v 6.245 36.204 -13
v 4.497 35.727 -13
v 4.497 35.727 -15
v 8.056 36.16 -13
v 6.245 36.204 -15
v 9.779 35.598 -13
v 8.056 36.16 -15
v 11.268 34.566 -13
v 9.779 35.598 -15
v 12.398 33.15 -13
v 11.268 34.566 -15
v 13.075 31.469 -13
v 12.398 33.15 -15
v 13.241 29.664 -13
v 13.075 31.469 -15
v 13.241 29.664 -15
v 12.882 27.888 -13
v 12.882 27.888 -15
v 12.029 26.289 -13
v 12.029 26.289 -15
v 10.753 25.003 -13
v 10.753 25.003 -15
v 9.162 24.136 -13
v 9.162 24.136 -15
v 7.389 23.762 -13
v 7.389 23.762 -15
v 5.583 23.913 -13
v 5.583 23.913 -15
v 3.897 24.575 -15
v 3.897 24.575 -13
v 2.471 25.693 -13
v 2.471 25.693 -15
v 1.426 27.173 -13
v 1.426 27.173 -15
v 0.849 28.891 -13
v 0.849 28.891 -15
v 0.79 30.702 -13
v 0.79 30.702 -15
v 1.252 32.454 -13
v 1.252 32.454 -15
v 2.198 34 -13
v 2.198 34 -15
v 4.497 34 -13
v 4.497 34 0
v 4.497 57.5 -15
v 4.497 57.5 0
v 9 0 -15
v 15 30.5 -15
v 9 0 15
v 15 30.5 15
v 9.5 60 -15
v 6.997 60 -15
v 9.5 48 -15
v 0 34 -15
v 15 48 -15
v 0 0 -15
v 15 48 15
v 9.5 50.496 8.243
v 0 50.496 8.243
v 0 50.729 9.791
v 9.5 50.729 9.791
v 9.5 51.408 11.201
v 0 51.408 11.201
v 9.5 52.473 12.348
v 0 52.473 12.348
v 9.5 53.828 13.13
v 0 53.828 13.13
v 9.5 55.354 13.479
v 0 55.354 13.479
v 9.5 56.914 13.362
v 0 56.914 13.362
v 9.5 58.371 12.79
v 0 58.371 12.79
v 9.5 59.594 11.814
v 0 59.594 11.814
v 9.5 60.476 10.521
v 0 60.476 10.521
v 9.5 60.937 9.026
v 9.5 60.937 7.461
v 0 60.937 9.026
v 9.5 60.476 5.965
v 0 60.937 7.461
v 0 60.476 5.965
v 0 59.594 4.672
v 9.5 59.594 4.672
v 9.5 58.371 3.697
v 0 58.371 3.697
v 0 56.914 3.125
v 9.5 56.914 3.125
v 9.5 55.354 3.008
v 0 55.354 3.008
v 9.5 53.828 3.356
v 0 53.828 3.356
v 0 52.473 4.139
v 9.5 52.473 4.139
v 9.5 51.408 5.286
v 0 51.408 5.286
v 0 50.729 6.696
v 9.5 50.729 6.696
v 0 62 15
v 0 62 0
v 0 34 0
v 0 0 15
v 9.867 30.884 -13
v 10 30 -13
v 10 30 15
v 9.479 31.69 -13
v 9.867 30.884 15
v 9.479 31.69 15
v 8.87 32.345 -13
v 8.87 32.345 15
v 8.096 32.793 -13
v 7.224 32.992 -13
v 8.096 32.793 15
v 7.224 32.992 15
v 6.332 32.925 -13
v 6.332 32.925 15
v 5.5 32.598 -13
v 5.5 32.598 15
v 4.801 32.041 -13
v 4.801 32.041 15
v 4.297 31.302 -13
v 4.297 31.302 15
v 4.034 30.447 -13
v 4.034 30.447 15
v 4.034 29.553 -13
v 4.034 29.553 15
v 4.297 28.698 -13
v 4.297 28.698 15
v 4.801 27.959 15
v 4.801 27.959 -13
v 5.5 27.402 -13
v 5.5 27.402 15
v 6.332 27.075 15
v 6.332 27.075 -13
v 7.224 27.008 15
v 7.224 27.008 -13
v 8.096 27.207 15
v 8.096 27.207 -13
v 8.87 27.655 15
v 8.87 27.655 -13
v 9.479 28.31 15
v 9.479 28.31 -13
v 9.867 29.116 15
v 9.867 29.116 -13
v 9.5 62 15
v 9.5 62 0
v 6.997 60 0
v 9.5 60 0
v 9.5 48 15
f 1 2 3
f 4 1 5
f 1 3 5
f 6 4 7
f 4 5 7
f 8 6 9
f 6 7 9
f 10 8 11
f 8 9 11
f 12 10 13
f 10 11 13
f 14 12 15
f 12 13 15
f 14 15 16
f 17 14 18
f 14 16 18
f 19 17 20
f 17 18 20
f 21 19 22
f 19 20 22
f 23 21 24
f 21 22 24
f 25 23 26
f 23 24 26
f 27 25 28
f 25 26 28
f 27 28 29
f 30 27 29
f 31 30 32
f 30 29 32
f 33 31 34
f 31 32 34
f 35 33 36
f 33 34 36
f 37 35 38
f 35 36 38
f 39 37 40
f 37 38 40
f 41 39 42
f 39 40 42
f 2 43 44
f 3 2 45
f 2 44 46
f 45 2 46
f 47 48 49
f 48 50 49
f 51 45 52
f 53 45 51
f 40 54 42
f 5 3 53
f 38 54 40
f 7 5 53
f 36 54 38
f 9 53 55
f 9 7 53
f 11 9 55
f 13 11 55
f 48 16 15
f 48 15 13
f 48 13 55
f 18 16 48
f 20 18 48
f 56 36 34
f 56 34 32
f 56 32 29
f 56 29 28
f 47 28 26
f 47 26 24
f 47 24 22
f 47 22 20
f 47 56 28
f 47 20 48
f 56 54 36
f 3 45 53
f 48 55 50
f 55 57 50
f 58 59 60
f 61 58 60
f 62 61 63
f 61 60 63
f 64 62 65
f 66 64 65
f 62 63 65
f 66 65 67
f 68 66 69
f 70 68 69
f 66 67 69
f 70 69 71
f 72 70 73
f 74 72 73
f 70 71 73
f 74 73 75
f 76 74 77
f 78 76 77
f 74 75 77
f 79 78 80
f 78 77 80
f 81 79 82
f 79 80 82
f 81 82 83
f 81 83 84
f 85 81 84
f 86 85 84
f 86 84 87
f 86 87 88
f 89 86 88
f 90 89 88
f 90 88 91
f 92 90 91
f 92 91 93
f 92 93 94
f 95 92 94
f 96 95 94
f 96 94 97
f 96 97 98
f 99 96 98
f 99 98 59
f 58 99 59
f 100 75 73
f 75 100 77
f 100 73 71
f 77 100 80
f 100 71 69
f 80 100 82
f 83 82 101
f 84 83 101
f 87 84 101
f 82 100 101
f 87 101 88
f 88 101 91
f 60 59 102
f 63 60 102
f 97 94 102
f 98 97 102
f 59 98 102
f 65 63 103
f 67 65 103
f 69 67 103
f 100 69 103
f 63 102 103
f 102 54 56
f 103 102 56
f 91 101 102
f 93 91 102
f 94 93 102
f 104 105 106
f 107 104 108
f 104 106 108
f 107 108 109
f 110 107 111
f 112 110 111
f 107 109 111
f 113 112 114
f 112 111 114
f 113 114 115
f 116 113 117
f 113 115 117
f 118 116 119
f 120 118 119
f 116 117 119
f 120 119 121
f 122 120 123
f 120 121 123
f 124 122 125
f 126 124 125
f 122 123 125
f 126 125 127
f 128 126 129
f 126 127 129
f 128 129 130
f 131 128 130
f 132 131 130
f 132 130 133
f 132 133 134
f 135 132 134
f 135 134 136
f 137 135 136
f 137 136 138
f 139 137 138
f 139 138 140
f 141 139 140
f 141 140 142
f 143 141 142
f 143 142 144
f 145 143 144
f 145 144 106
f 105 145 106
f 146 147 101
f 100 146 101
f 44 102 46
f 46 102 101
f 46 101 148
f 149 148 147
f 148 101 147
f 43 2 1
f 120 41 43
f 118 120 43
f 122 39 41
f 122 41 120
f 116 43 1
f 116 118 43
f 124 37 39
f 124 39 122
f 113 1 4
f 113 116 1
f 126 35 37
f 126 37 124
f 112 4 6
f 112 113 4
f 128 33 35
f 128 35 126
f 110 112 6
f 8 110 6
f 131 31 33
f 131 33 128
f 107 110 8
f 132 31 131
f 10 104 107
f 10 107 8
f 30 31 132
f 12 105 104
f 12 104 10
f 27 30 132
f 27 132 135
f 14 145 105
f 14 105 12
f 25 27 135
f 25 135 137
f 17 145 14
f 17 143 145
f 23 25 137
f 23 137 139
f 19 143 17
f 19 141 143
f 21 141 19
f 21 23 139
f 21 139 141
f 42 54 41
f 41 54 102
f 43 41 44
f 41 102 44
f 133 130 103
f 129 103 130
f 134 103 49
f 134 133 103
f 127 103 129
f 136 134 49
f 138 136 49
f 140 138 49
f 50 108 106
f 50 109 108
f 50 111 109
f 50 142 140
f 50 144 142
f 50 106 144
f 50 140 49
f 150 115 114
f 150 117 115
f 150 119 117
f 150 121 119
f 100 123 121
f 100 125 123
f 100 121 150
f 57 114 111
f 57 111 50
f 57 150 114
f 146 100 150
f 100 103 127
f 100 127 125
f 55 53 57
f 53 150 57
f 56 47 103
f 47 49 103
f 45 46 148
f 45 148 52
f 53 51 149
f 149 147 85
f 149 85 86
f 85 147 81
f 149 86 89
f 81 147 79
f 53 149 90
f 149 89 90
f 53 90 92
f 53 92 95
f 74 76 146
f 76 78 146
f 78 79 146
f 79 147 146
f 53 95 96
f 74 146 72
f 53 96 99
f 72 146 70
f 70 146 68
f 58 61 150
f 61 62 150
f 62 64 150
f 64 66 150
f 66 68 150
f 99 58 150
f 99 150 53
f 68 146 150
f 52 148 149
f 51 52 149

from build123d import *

# Parameters (mm, degrees)
F1_DEPTH  = 15
F3_DEPTH  = 15
F4_SIZE   = 2.5
F5_R      = 5.25
F6_DEPTH  = 15
F7_R      = 3
F8_DEPTH  = 35
F9_R      = 6.25
F10_DEPTH = 2


with BuildPart() as f1:
    # F0 (on Top) → F1 (new body)
    with BuildSketch(Plane.XY):
        Polygon((0, 62), (0, 0), (9, 0), (15, 30.5), (15, 48), (9.5, 48), (9.5, 62), align=None)
    extrude(amount=F1_DEPTH)

    # F2 (on face) → F3 (join)
    with BuildSketch(Plane(origin=(0, 0, 0), x_dir=(1, 0, 0), z_dir=(0, 0, -1))):
        Polygon((4.496674, -60), (9.5, -60), (9.5, -48), (15, -48), (15, -30.5), (9, 0), (0, 0), (0, -34), (4.496674, -34), align=None)
    extrude(amount=F3_DEPTH)

    # F4
    f4_edges = [f1.edges().sort_by_distance(p)[0] for p in [
        (4.496674, 60, -7.5),
    ]]
    chamfer(f4_edges, length=F4_SIZE)

    # F5 (on face) → F6 (cut)
    with BuildSketch(Plane(origin=(0, 0, 0), x_dir=(0, -1, 0), z_dir=(-1, 0, 0))):
        with Locations((-55.745944, 8.24335)):
            Circle(F5_R)
    extrude(amount=-F6_DEPTH, mode=Mode.SUBTRACT)

    # F7 (on face) → F8 (cut)
    with BuildSketch(Plane.XY.offset(15)):
        with Locations((7, 30)):
            Circle(F7_R)
    extrude(amount=-F8_DEPTH, mode=Mode.SUBTRACT)

    # F9 (on face) → F10 (cut)
    with BuildSketch(Plane(origin=(0, 0, -15), x_dir=(1, 0, 0), z_dir=(0, 0, -1))):
        with Locations((7, -30)):
            Circle(F9_R)
    extrude(amount=-F10_DEPTH, mode=Mode.SUBTRACT)


solid = f1.part
